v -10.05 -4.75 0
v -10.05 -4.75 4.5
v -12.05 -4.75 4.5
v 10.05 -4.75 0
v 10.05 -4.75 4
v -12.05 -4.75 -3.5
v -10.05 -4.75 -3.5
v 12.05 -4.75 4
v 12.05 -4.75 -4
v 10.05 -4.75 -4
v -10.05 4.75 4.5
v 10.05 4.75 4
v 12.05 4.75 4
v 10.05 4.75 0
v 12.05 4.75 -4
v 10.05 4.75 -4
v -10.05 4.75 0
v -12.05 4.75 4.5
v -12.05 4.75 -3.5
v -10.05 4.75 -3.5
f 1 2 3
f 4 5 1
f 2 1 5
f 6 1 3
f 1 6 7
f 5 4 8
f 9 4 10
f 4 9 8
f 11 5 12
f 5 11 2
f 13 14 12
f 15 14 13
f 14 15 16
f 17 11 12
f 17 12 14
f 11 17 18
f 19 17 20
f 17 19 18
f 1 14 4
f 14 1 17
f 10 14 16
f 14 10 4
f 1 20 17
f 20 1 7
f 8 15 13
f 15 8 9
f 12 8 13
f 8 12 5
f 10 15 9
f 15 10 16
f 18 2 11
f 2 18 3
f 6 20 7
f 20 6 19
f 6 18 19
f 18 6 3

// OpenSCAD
height=20.1;
wedge_z1 = 0;
wedge_z2 = 4.5;
wedge_z3 = 4;
wedge_y = 10-0.5;
foot_z = 8;

module wedge() {
    polyhedron(
        points=[
                [-height/2,-wedge_y/2, wedge_z1],
                [-height/2,-wedge_y/2, wedge_z2],
                [height/2,-wedge_y/2, wedge_z3],
                [height/2,-wedge_y/2, wedge_z1],
                [-height/2,wedge_y/2, wedge_z1],
                [-height/2,wedge_y/2, wedge_z2],
                [height/2,wedge_y/2, wedge_z3],
                [height/2,wedge_y/2, wedge_z1],
              ],
        faces =[
                [0,3,2,1],
                [1,2,6,5],
                [5,6,7,4],
                [4,7,3,0],
                [6,2,3,7],
                [0,1,5,4],
            
    ]);
}

wedge();
translate([height/2, -wedge_y/2, -foot_z + wedge_z3]) cube([2, wedge_y, foot_z]);
translate([-height/2-2, -wedge_y/2, -foot_z + wedge_z2]) cube([2, wedge_y, foot_z]);
